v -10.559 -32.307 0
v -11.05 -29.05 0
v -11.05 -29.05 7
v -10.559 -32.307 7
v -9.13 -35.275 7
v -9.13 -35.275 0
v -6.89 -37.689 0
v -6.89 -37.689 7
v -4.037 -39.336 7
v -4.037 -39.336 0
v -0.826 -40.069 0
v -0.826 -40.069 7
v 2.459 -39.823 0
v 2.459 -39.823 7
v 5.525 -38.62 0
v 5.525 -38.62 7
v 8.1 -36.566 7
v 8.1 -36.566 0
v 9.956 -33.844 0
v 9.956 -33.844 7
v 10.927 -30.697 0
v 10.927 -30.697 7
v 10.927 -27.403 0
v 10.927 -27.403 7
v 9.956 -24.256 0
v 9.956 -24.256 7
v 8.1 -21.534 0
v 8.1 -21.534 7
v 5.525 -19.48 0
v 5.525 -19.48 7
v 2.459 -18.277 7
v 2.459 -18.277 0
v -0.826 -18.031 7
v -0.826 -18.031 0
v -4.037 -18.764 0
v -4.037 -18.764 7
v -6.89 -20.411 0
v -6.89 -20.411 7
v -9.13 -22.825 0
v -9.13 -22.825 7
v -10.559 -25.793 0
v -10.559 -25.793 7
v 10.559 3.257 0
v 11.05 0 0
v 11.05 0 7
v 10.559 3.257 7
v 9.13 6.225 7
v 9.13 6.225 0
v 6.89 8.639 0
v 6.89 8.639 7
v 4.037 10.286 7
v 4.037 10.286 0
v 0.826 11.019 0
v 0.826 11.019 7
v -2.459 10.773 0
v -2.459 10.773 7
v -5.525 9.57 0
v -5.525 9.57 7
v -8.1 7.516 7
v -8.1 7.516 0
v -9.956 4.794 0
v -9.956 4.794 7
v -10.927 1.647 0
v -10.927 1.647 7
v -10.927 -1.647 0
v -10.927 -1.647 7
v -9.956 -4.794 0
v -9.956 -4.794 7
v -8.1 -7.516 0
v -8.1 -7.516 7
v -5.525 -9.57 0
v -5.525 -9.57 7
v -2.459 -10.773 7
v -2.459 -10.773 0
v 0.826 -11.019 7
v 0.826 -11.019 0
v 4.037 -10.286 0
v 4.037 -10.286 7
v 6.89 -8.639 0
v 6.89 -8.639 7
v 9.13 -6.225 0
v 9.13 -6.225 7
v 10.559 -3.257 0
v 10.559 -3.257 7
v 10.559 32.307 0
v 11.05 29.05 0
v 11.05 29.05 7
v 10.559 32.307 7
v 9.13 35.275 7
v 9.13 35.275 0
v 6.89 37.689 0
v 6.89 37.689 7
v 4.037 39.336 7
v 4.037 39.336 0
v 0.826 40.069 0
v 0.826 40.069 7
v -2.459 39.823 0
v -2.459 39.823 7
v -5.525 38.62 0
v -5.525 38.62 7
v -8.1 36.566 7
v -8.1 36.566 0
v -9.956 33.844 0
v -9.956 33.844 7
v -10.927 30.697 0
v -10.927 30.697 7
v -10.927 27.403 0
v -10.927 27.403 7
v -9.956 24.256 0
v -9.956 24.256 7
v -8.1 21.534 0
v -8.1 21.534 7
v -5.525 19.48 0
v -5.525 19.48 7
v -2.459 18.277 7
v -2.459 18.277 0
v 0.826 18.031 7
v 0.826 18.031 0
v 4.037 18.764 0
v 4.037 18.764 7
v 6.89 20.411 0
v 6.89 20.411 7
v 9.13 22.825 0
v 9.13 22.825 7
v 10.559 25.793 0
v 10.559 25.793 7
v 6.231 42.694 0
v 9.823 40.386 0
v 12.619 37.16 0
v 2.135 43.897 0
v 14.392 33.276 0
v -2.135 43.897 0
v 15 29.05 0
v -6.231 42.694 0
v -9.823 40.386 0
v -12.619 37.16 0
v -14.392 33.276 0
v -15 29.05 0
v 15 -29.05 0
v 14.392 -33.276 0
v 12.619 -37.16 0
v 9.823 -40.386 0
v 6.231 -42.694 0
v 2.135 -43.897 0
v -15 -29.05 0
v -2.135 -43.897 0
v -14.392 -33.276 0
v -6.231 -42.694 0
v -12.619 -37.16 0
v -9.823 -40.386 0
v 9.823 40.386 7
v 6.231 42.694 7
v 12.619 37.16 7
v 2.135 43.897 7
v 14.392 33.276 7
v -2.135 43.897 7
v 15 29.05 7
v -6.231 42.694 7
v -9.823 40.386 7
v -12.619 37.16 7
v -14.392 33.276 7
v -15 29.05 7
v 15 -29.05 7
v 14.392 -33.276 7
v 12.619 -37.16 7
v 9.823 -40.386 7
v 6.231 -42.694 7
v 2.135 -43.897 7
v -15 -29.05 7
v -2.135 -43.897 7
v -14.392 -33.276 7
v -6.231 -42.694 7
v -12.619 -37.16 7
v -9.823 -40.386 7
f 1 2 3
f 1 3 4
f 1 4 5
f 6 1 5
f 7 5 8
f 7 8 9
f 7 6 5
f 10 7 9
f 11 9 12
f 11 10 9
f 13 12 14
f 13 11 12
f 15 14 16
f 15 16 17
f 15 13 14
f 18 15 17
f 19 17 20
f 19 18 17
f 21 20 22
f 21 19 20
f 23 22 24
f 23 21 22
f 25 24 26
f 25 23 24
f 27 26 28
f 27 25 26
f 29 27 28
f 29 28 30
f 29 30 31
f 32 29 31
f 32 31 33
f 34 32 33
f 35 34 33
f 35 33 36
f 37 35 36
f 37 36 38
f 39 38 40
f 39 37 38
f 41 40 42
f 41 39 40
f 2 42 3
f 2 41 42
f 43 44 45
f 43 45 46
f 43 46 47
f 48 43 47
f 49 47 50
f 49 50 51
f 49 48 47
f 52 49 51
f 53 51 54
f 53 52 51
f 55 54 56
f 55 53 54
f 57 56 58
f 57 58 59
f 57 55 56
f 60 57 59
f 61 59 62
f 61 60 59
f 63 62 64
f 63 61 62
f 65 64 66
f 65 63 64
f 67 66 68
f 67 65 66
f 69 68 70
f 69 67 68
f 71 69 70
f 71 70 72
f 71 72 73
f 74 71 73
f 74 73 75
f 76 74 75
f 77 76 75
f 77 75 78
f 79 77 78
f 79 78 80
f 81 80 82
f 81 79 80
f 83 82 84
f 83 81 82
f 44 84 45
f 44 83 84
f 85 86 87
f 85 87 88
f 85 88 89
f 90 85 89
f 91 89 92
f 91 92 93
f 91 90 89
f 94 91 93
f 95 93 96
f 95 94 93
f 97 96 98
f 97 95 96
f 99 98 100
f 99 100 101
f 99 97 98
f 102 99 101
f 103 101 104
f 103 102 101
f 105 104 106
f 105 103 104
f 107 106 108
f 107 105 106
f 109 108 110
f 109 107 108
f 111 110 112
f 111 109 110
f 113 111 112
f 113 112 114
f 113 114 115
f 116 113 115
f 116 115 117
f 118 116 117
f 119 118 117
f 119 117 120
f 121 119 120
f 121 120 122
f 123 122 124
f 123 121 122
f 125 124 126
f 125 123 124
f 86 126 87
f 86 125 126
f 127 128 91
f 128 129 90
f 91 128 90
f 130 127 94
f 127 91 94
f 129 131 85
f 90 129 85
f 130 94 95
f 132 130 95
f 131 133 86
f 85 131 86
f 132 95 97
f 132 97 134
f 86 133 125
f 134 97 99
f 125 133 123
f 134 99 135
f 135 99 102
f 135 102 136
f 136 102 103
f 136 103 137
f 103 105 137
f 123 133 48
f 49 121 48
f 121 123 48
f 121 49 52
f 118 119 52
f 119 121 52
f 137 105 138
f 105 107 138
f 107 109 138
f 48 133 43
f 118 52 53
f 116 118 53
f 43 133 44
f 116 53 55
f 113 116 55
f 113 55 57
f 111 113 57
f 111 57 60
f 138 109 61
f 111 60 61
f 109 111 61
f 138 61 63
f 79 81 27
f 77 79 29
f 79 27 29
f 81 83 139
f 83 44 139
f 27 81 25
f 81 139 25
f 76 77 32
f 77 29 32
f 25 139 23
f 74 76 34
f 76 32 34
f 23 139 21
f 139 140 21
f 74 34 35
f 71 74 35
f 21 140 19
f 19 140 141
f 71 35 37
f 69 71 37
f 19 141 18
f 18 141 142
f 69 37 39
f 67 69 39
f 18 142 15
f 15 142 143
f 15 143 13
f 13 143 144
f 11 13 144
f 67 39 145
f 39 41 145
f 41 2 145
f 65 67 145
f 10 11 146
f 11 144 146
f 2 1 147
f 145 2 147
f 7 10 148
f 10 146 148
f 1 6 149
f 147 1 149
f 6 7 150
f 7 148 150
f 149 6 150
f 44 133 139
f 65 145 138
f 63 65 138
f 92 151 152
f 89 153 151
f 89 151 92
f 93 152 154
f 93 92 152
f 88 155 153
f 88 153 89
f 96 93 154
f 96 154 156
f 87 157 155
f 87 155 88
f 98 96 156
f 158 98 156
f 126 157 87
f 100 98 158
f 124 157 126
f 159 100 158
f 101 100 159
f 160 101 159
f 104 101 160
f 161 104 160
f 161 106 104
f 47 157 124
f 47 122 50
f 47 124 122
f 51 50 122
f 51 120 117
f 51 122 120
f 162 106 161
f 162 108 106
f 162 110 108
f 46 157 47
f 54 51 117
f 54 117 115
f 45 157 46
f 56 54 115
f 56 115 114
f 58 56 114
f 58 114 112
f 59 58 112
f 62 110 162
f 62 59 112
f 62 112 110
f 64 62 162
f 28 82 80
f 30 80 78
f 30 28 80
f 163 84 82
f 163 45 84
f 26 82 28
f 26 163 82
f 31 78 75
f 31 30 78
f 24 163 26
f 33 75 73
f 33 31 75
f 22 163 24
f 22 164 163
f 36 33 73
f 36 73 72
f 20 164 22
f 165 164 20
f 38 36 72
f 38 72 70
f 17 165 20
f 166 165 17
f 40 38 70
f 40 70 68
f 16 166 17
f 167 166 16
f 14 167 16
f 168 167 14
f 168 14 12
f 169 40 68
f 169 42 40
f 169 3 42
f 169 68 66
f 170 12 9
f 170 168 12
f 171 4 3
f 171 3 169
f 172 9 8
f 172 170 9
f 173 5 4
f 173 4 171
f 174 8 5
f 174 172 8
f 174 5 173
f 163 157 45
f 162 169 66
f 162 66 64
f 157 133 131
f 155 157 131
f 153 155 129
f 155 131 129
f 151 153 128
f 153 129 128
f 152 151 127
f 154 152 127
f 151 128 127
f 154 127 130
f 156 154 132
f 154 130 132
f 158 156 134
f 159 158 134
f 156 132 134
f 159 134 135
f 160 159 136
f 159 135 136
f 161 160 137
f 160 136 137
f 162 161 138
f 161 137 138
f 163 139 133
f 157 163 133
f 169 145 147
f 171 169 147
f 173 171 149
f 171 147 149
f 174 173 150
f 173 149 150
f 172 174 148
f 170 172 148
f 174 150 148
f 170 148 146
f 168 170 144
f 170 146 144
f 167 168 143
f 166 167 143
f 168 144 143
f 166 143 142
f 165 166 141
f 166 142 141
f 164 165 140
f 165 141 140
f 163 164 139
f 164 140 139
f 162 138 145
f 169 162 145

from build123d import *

# Parameters (mm, degrees)
F0_R     = 11.05
F1_DEPTH = 7
F2_DEPTH = 7
F3_COUNT = 2


with BuildPart() as f1:
    # F0 (on Top) → F1 (new body)
    with BuildSketch(Plane.XY):
        with BuildLine():
            ThreePointArc((-15, 0), (0, -15), (15, 0))
            ThreePointArc((15, 0), (0, 15), (-15, 0))
        make_face()
        Circle(F0_R, mode=Mode.SUBTRACT)
    extrude(amount=F1_DEPTH)



with BuildPart() as f2:
    # F0 (on Top) → F2 (new body, through all)
    with BuildSketch(Plane.XY):
        with BuildLine():
            ThreePointArc((-15, 0), (0, 15), (15, 0))
            Line((15, 0), (15, 29.05))
            ThreePointArc((15, 29.05), (0, 44.05), (-15, 29.05))
            Line((-15, 29.05), (-15, 0))
        make_face()
        with Locations((0, 29.05)):
            Circle(F0_R, mode=Mode.SUBTRACT)
    extrude(amount=F2_DEPTH)


with BuildPart() as f1_1:
    add(f1.part)

    add(f2.part)  # F3 merges F2
    # F3: F2 ×2 about axis
    f3_axis = Axis((0, 0, 0), (0, 0, 1))
    for i in range(1, F3_COUNT):
        add(f2.part.rotate(f3_axis, i * 360 / F3_COUNT))


solid = f1_1.part
